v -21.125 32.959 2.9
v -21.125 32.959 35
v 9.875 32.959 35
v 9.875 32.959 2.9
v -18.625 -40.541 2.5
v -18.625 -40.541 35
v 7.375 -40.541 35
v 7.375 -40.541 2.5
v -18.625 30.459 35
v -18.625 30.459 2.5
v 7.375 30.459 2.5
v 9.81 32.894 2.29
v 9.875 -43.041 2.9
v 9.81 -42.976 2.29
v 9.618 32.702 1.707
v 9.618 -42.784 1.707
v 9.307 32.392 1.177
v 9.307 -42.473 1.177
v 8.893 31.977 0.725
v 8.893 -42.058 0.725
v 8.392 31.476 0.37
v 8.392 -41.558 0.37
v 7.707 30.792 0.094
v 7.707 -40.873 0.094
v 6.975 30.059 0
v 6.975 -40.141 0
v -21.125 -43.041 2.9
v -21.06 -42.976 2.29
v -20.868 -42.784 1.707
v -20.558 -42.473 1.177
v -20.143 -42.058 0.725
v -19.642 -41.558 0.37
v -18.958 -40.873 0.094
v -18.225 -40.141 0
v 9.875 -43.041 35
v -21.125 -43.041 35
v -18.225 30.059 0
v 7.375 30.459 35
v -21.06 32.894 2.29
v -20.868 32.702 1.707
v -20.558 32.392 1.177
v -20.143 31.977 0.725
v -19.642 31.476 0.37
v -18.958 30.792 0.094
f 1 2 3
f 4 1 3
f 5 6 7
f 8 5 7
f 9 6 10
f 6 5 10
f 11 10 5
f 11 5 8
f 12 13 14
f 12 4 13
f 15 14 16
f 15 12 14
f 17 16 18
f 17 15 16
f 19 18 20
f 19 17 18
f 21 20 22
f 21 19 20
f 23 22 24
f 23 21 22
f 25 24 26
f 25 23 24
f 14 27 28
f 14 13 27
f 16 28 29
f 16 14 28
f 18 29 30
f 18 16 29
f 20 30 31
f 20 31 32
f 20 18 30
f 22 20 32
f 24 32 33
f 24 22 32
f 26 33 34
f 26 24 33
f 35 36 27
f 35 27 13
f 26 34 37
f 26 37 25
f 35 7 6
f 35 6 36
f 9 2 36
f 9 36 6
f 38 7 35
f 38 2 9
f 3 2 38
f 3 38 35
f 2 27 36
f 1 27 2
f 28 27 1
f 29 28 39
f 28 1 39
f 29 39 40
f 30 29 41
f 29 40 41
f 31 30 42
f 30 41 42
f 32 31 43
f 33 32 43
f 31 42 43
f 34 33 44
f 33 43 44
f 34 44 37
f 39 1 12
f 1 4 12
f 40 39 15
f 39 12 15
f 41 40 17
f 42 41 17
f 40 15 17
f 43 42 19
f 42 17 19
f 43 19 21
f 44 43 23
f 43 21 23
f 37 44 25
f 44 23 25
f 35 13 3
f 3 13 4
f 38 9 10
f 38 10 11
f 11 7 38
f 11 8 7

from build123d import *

# Parameters (mm, degrees)
F0_W     = 31
F0_H     = 76
F1_DEPTH = 35
F2_T     = -2.5
F3_R     = 2.9


with BuildPart() as f1:
    # F0 (on Top) → F1 (new body)
    with BuildSketch(Plane.XY):
        with Locations((-5.62528, -5.040663)):
            Rectangle(F0_W, F0_H)
    extrude(amount=F1_DEPTH)

    # F2
    f2_openings = [f1.faces().sort_by_distance(p)[0] for p in [
        (-5.62528, -5.040663, 35),
    ]]
    offset(amount=F2_T, openings=f2_openings)

    # F3
    f3_edges = [f1.edges().sort_by_distance(p)[0] for p in [
        (-5.62528, -43.040663, 0),
        (9.87472, -5.040663, 0),
        (-21.12528, -5.040663, 0),
        (-5.62528, 32.959337, 0),
    ]]
    fillet(f3_edges, radius=F3_R)


solid = f1.part
